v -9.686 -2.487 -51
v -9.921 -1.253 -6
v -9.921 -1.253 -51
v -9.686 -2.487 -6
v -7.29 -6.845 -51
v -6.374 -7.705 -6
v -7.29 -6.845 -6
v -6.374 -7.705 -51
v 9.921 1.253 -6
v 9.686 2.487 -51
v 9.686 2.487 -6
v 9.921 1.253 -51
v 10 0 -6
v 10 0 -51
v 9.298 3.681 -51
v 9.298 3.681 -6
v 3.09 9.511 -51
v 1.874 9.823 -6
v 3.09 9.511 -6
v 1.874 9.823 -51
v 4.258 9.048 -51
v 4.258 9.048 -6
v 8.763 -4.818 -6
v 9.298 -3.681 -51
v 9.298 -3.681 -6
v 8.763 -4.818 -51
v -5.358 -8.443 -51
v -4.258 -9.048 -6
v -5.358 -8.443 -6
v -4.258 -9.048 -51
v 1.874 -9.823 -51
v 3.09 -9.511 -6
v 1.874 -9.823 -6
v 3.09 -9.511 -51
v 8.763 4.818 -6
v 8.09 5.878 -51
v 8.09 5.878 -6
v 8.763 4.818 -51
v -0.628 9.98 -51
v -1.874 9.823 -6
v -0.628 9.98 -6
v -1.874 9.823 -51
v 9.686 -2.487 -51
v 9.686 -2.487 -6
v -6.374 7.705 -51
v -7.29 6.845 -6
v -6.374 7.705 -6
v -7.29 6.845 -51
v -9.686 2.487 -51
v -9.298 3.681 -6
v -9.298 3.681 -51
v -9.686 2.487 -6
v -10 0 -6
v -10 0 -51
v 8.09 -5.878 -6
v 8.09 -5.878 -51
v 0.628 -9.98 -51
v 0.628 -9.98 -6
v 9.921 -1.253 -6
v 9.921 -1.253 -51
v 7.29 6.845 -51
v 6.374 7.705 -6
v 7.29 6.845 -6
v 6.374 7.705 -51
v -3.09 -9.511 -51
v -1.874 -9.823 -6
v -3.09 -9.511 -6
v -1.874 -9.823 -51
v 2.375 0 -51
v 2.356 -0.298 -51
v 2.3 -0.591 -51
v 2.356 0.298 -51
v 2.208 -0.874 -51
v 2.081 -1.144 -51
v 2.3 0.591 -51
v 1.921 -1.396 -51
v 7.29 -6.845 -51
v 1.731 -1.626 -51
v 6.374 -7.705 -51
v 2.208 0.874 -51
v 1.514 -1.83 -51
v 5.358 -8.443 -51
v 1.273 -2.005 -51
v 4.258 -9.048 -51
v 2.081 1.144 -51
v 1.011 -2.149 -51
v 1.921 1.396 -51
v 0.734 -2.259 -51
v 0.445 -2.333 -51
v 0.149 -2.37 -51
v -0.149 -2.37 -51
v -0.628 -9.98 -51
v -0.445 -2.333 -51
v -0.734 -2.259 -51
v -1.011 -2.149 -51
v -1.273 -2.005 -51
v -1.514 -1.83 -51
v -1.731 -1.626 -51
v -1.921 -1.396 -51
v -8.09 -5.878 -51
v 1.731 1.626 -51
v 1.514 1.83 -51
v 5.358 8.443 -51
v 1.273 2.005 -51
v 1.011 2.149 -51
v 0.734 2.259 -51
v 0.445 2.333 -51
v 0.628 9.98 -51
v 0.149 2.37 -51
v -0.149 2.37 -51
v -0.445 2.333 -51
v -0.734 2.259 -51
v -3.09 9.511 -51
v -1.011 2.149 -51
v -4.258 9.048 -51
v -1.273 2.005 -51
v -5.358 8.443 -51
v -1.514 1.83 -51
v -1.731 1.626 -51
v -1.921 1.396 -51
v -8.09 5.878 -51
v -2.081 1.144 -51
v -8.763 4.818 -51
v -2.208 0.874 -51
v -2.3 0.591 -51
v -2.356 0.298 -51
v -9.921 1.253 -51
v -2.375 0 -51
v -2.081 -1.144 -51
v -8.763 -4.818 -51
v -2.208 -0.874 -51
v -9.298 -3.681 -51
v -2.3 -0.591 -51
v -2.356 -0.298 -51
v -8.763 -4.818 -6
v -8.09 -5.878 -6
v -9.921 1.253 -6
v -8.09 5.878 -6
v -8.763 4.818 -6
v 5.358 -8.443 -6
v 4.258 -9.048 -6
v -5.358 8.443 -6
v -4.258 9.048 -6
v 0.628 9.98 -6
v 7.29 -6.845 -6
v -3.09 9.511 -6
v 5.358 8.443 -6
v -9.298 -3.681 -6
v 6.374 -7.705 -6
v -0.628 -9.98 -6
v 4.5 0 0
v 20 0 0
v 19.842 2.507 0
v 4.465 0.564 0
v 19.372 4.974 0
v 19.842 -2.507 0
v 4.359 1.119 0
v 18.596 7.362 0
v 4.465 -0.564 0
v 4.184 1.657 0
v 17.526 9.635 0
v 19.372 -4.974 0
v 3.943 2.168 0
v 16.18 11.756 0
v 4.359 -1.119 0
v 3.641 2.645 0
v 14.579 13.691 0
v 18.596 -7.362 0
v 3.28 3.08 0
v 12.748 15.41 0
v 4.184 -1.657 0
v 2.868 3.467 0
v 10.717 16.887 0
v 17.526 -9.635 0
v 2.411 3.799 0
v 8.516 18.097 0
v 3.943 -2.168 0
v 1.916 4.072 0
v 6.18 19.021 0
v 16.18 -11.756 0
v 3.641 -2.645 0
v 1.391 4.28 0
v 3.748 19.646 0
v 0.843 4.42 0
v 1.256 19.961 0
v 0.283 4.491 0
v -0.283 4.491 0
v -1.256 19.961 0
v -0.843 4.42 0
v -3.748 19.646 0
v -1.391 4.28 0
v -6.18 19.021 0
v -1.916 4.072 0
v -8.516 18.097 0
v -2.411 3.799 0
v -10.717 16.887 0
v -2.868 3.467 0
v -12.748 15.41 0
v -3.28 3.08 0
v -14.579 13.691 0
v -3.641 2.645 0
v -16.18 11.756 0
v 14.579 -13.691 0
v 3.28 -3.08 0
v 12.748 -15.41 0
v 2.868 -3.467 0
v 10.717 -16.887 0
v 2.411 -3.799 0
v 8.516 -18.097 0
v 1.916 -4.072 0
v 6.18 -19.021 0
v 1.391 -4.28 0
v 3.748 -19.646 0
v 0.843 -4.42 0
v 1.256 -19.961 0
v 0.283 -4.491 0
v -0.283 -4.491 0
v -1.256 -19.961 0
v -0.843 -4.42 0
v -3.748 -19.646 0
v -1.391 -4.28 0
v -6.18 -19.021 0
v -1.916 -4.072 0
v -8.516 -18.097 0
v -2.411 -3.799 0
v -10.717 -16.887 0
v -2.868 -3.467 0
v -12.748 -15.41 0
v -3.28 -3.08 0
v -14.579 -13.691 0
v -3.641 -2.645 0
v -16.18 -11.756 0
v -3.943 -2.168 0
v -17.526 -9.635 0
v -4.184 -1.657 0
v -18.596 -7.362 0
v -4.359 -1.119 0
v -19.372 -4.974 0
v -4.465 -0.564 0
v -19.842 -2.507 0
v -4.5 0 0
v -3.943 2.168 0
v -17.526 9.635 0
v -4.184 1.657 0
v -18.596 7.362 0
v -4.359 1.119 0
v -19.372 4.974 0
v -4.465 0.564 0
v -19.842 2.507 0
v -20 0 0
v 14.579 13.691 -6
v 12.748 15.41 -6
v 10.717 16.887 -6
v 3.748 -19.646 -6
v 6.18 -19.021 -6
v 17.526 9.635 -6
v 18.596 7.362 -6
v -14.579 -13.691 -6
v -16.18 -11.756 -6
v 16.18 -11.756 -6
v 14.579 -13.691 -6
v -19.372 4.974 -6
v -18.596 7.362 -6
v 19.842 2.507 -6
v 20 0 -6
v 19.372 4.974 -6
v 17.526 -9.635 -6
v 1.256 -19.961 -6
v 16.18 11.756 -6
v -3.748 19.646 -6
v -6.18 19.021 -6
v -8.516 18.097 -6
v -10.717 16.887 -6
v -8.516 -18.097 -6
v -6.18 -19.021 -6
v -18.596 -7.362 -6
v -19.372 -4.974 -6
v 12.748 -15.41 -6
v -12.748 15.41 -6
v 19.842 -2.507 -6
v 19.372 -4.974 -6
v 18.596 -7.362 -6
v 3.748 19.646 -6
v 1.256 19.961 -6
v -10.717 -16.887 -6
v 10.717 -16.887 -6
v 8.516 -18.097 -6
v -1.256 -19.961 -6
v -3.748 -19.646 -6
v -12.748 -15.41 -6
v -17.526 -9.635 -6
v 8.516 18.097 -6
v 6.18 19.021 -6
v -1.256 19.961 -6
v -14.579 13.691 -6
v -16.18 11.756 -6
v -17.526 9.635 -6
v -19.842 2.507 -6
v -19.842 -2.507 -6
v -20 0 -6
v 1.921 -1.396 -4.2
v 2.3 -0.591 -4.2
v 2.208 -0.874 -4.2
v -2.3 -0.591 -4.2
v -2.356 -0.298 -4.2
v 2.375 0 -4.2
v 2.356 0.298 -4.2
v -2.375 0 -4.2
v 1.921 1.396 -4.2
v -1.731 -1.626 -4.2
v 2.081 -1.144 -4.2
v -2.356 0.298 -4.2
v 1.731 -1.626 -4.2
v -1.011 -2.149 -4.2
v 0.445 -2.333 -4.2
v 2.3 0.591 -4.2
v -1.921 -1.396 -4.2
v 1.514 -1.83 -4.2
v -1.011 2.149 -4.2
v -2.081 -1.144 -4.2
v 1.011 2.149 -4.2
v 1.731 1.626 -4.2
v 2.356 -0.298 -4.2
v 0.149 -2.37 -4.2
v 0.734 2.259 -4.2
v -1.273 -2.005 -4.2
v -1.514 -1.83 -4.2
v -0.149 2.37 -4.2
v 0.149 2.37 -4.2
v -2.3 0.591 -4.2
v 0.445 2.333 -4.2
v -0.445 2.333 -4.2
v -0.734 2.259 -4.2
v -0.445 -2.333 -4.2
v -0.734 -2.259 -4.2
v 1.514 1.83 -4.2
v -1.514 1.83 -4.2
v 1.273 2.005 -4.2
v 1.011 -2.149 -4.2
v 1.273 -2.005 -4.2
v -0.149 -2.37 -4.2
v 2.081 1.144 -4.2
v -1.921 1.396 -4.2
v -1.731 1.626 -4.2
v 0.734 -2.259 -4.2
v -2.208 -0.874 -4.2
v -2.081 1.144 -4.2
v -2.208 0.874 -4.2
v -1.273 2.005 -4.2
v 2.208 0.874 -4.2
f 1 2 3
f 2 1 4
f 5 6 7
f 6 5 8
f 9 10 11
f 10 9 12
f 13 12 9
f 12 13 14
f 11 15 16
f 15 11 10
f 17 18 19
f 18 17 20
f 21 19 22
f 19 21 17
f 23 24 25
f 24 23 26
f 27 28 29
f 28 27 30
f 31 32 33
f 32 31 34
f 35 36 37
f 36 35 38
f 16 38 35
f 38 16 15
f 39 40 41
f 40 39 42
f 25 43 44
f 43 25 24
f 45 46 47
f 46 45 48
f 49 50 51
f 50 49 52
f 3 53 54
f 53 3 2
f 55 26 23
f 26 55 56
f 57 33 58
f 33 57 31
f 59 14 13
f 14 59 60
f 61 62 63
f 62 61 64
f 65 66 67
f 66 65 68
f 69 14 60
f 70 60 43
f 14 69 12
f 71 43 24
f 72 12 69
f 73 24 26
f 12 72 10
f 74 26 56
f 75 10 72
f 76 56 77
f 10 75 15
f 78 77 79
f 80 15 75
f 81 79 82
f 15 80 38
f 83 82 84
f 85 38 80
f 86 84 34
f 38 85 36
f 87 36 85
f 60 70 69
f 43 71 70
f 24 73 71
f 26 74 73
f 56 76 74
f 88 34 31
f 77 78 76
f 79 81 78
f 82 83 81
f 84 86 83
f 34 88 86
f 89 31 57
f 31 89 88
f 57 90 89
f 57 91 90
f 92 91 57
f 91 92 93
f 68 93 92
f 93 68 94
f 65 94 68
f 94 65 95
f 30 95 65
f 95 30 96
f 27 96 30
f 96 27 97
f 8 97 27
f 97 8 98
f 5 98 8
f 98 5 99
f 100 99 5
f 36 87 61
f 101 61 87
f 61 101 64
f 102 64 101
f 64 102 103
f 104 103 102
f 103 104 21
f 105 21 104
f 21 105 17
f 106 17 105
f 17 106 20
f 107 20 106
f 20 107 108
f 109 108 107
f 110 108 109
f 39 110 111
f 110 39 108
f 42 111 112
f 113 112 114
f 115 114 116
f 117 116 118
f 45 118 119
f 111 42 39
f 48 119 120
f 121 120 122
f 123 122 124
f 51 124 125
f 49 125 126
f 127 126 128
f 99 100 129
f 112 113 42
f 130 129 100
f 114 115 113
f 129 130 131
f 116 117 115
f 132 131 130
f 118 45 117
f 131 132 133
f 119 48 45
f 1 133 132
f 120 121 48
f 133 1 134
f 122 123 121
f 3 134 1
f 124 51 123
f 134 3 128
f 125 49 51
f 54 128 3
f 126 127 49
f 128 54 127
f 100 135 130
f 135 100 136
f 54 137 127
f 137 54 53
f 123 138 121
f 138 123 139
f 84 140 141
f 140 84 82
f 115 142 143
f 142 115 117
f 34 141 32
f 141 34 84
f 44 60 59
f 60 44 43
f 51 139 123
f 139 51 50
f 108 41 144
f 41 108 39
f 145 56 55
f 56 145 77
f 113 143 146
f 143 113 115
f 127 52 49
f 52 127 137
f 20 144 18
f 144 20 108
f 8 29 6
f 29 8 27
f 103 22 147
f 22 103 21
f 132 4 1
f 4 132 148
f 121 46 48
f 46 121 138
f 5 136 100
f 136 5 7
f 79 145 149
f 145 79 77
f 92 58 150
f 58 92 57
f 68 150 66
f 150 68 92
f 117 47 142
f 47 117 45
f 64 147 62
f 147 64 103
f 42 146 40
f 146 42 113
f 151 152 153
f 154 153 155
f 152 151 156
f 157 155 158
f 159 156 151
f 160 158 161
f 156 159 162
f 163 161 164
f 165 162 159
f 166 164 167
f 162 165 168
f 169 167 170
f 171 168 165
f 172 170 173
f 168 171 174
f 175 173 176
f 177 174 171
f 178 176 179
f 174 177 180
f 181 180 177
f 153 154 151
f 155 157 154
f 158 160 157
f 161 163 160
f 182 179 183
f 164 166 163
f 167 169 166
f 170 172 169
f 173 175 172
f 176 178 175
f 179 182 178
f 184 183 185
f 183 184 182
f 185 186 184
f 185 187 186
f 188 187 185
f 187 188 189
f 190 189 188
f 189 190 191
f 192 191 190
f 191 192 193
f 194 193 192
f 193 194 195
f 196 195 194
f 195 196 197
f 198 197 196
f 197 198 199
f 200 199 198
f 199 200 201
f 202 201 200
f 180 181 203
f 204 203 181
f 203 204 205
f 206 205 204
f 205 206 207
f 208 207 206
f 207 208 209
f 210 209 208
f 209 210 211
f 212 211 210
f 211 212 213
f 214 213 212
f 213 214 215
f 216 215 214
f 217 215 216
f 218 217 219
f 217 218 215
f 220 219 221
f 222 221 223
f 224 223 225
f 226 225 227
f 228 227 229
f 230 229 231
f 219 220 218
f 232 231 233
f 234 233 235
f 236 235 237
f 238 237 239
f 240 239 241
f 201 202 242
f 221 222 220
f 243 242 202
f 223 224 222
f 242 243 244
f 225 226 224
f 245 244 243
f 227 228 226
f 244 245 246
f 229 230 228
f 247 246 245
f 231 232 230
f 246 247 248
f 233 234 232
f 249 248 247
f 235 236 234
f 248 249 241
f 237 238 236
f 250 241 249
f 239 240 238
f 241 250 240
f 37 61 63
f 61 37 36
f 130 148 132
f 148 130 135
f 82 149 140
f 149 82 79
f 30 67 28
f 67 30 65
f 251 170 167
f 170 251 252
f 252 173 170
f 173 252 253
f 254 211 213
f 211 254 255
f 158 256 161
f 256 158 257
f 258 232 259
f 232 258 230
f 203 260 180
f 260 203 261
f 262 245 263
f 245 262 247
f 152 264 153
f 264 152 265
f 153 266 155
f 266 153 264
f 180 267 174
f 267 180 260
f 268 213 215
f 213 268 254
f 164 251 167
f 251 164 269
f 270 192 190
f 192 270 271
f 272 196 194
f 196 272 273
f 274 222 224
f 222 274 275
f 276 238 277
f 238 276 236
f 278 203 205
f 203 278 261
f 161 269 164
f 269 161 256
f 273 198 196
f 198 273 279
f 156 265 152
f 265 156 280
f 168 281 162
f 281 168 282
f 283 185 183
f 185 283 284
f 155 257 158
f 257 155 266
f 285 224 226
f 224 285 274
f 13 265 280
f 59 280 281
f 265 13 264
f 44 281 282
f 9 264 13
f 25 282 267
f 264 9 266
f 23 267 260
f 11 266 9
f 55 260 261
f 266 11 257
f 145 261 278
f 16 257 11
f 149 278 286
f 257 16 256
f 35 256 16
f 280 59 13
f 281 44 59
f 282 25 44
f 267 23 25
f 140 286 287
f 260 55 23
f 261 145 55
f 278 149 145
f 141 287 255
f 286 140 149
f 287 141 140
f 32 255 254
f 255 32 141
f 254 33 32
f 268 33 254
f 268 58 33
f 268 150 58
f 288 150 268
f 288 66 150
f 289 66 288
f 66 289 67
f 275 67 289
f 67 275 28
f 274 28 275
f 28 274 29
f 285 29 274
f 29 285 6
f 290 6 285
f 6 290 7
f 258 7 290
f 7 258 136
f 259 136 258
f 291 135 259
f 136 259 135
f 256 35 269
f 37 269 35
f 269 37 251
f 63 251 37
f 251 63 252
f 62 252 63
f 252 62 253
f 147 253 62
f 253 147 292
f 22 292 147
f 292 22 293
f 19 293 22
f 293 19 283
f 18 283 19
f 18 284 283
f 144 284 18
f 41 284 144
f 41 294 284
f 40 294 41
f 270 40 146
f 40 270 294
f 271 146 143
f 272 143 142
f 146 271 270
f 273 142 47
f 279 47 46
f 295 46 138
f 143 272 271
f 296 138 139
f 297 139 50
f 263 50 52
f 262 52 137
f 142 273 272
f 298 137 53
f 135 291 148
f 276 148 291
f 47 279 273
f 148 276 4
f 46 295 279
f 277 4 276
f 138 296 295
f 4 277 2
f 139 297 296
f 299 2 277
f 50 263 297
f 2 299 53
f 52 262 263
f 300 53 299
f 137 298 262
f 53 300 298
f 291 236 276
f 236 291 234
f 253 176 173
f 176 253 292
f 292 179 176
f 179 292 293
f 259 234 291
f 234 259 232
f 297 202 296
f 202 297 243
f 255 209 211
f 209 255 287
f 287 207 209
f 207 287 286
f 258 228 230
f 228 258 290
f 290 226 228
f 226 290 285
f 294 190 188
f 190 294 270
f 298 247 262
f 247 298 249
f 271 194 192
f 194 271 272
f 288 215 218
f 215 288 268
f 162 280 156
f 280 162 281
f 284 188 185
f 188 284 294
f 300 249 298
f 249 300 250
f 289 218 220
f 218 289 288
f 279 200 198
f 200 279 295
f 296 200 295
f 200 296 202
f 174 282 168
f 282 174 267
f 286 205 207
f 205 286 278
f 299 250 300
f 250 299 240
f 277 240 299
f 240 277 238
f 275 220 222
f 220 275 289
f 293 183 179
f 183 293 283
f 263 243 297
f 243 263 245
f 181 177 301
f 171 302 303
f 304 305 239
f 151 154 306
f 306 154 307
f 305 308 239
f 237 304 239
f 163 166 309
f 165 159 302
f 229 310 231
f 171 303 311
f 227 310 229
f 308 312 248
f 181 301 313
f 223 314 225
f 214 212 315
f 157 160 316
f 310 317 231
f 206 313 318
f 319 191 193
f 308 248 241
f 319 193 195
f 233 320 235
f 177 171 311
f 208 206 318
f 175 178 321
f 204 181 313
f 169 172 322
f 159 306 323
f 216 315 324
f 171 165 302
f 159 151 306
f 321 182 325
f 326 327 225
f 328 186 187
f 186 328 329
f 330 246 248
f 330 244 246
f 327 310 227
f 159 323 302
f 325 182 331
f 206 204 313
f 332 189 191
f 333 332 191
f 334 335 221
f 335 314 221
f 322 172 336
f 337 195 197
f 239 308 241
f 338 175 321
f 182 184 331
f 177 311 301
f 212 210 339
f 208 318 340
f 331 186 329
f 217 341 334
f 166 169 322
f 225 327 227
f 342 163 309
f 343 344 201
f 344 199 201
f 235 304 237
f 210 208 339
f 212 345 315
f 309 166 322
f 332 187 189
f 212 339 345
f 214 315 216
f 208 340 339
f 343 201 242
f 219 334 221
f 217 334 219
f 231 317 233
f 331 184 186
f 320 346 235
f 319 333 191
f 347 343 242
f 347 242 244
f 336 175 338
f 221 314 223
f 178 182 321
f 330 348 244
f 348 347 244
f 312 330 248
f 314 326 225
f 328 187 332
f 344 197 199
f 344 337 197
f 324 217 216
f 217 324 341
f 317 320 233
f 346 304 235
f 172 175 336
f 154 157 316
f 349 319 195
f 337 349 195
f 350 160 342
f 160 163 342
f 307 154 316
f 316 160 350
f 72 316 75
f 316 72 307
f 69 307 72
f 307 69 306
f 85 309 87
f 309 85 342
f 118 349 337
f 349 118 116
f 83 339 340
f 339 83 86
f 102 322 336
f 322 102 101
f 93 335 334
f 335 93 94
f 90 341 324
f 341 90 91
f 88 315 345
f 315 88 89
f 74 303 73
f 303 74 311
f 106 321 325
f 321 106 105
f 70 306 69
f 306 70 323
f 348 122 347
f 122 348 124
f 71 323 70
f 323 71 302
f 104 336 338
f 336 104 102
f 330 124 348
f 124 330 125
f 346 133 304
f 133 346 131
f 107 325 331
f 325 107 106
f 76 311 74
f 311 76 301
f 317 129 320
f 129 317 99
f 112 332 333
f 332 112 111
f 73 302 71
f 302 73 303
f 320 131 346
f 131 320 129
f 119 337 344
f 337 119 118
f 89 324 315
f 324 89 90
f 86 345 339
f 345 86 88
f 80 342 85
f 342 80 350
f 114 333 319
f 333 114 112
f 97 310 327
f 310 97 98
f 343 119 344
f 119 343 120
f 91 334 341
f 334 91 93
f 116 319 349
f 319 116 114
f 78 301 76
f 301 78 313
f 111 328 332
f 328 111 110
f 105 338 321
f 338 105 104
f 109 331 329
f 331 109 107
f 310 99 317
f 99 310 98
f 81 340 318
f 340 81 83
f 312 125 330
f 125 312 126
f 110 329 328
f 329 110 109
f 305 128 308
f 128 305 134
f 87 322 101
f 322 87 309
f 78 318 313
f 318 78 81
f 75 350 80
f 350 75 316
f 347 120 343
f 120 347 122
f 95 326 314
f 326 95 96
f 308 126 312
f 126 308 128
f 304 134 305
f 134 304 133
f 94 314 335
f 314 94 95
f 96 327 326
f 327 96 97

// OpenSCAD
$fn = 50;


difference() {
	union() {
		translate(v = [0, 0, -51.0000000000]) {
			cylinder(h = 51, r = 10.0000000000);
		}
		translate(v = [0, 0, -6.0000000000]) {
			cylinder(h = 6, r = 20.0000000000);
		}
	}
	union() {
		translate(v = [0, 0, 0]) {
			rotate(a = [0, 0, 0]) {
				difference() {
					union() {
						#translate(v = [0, 0, -51.0000000000]) {
							cylinder(h = 51, r = 2.2500000000);
						}
						#translate(v = [0, 0, -4.2000000000]) {
							cylinder(h = 4.2000000000, r = 10.0000000000, r1 = 2.3750000000, r2 = 4.5000000000);
						}
						#translate(v = [0, 0, -51.0000000000]) {
							cylinder(h = 51, r = 2.3750000000);
						}
						#translate(v = [0, 0, -51.0000000000]) {
							cylinder(h = 51, r = 2.2500000000);
						}
					}
					union();
				}
			}
		}
	}
}
